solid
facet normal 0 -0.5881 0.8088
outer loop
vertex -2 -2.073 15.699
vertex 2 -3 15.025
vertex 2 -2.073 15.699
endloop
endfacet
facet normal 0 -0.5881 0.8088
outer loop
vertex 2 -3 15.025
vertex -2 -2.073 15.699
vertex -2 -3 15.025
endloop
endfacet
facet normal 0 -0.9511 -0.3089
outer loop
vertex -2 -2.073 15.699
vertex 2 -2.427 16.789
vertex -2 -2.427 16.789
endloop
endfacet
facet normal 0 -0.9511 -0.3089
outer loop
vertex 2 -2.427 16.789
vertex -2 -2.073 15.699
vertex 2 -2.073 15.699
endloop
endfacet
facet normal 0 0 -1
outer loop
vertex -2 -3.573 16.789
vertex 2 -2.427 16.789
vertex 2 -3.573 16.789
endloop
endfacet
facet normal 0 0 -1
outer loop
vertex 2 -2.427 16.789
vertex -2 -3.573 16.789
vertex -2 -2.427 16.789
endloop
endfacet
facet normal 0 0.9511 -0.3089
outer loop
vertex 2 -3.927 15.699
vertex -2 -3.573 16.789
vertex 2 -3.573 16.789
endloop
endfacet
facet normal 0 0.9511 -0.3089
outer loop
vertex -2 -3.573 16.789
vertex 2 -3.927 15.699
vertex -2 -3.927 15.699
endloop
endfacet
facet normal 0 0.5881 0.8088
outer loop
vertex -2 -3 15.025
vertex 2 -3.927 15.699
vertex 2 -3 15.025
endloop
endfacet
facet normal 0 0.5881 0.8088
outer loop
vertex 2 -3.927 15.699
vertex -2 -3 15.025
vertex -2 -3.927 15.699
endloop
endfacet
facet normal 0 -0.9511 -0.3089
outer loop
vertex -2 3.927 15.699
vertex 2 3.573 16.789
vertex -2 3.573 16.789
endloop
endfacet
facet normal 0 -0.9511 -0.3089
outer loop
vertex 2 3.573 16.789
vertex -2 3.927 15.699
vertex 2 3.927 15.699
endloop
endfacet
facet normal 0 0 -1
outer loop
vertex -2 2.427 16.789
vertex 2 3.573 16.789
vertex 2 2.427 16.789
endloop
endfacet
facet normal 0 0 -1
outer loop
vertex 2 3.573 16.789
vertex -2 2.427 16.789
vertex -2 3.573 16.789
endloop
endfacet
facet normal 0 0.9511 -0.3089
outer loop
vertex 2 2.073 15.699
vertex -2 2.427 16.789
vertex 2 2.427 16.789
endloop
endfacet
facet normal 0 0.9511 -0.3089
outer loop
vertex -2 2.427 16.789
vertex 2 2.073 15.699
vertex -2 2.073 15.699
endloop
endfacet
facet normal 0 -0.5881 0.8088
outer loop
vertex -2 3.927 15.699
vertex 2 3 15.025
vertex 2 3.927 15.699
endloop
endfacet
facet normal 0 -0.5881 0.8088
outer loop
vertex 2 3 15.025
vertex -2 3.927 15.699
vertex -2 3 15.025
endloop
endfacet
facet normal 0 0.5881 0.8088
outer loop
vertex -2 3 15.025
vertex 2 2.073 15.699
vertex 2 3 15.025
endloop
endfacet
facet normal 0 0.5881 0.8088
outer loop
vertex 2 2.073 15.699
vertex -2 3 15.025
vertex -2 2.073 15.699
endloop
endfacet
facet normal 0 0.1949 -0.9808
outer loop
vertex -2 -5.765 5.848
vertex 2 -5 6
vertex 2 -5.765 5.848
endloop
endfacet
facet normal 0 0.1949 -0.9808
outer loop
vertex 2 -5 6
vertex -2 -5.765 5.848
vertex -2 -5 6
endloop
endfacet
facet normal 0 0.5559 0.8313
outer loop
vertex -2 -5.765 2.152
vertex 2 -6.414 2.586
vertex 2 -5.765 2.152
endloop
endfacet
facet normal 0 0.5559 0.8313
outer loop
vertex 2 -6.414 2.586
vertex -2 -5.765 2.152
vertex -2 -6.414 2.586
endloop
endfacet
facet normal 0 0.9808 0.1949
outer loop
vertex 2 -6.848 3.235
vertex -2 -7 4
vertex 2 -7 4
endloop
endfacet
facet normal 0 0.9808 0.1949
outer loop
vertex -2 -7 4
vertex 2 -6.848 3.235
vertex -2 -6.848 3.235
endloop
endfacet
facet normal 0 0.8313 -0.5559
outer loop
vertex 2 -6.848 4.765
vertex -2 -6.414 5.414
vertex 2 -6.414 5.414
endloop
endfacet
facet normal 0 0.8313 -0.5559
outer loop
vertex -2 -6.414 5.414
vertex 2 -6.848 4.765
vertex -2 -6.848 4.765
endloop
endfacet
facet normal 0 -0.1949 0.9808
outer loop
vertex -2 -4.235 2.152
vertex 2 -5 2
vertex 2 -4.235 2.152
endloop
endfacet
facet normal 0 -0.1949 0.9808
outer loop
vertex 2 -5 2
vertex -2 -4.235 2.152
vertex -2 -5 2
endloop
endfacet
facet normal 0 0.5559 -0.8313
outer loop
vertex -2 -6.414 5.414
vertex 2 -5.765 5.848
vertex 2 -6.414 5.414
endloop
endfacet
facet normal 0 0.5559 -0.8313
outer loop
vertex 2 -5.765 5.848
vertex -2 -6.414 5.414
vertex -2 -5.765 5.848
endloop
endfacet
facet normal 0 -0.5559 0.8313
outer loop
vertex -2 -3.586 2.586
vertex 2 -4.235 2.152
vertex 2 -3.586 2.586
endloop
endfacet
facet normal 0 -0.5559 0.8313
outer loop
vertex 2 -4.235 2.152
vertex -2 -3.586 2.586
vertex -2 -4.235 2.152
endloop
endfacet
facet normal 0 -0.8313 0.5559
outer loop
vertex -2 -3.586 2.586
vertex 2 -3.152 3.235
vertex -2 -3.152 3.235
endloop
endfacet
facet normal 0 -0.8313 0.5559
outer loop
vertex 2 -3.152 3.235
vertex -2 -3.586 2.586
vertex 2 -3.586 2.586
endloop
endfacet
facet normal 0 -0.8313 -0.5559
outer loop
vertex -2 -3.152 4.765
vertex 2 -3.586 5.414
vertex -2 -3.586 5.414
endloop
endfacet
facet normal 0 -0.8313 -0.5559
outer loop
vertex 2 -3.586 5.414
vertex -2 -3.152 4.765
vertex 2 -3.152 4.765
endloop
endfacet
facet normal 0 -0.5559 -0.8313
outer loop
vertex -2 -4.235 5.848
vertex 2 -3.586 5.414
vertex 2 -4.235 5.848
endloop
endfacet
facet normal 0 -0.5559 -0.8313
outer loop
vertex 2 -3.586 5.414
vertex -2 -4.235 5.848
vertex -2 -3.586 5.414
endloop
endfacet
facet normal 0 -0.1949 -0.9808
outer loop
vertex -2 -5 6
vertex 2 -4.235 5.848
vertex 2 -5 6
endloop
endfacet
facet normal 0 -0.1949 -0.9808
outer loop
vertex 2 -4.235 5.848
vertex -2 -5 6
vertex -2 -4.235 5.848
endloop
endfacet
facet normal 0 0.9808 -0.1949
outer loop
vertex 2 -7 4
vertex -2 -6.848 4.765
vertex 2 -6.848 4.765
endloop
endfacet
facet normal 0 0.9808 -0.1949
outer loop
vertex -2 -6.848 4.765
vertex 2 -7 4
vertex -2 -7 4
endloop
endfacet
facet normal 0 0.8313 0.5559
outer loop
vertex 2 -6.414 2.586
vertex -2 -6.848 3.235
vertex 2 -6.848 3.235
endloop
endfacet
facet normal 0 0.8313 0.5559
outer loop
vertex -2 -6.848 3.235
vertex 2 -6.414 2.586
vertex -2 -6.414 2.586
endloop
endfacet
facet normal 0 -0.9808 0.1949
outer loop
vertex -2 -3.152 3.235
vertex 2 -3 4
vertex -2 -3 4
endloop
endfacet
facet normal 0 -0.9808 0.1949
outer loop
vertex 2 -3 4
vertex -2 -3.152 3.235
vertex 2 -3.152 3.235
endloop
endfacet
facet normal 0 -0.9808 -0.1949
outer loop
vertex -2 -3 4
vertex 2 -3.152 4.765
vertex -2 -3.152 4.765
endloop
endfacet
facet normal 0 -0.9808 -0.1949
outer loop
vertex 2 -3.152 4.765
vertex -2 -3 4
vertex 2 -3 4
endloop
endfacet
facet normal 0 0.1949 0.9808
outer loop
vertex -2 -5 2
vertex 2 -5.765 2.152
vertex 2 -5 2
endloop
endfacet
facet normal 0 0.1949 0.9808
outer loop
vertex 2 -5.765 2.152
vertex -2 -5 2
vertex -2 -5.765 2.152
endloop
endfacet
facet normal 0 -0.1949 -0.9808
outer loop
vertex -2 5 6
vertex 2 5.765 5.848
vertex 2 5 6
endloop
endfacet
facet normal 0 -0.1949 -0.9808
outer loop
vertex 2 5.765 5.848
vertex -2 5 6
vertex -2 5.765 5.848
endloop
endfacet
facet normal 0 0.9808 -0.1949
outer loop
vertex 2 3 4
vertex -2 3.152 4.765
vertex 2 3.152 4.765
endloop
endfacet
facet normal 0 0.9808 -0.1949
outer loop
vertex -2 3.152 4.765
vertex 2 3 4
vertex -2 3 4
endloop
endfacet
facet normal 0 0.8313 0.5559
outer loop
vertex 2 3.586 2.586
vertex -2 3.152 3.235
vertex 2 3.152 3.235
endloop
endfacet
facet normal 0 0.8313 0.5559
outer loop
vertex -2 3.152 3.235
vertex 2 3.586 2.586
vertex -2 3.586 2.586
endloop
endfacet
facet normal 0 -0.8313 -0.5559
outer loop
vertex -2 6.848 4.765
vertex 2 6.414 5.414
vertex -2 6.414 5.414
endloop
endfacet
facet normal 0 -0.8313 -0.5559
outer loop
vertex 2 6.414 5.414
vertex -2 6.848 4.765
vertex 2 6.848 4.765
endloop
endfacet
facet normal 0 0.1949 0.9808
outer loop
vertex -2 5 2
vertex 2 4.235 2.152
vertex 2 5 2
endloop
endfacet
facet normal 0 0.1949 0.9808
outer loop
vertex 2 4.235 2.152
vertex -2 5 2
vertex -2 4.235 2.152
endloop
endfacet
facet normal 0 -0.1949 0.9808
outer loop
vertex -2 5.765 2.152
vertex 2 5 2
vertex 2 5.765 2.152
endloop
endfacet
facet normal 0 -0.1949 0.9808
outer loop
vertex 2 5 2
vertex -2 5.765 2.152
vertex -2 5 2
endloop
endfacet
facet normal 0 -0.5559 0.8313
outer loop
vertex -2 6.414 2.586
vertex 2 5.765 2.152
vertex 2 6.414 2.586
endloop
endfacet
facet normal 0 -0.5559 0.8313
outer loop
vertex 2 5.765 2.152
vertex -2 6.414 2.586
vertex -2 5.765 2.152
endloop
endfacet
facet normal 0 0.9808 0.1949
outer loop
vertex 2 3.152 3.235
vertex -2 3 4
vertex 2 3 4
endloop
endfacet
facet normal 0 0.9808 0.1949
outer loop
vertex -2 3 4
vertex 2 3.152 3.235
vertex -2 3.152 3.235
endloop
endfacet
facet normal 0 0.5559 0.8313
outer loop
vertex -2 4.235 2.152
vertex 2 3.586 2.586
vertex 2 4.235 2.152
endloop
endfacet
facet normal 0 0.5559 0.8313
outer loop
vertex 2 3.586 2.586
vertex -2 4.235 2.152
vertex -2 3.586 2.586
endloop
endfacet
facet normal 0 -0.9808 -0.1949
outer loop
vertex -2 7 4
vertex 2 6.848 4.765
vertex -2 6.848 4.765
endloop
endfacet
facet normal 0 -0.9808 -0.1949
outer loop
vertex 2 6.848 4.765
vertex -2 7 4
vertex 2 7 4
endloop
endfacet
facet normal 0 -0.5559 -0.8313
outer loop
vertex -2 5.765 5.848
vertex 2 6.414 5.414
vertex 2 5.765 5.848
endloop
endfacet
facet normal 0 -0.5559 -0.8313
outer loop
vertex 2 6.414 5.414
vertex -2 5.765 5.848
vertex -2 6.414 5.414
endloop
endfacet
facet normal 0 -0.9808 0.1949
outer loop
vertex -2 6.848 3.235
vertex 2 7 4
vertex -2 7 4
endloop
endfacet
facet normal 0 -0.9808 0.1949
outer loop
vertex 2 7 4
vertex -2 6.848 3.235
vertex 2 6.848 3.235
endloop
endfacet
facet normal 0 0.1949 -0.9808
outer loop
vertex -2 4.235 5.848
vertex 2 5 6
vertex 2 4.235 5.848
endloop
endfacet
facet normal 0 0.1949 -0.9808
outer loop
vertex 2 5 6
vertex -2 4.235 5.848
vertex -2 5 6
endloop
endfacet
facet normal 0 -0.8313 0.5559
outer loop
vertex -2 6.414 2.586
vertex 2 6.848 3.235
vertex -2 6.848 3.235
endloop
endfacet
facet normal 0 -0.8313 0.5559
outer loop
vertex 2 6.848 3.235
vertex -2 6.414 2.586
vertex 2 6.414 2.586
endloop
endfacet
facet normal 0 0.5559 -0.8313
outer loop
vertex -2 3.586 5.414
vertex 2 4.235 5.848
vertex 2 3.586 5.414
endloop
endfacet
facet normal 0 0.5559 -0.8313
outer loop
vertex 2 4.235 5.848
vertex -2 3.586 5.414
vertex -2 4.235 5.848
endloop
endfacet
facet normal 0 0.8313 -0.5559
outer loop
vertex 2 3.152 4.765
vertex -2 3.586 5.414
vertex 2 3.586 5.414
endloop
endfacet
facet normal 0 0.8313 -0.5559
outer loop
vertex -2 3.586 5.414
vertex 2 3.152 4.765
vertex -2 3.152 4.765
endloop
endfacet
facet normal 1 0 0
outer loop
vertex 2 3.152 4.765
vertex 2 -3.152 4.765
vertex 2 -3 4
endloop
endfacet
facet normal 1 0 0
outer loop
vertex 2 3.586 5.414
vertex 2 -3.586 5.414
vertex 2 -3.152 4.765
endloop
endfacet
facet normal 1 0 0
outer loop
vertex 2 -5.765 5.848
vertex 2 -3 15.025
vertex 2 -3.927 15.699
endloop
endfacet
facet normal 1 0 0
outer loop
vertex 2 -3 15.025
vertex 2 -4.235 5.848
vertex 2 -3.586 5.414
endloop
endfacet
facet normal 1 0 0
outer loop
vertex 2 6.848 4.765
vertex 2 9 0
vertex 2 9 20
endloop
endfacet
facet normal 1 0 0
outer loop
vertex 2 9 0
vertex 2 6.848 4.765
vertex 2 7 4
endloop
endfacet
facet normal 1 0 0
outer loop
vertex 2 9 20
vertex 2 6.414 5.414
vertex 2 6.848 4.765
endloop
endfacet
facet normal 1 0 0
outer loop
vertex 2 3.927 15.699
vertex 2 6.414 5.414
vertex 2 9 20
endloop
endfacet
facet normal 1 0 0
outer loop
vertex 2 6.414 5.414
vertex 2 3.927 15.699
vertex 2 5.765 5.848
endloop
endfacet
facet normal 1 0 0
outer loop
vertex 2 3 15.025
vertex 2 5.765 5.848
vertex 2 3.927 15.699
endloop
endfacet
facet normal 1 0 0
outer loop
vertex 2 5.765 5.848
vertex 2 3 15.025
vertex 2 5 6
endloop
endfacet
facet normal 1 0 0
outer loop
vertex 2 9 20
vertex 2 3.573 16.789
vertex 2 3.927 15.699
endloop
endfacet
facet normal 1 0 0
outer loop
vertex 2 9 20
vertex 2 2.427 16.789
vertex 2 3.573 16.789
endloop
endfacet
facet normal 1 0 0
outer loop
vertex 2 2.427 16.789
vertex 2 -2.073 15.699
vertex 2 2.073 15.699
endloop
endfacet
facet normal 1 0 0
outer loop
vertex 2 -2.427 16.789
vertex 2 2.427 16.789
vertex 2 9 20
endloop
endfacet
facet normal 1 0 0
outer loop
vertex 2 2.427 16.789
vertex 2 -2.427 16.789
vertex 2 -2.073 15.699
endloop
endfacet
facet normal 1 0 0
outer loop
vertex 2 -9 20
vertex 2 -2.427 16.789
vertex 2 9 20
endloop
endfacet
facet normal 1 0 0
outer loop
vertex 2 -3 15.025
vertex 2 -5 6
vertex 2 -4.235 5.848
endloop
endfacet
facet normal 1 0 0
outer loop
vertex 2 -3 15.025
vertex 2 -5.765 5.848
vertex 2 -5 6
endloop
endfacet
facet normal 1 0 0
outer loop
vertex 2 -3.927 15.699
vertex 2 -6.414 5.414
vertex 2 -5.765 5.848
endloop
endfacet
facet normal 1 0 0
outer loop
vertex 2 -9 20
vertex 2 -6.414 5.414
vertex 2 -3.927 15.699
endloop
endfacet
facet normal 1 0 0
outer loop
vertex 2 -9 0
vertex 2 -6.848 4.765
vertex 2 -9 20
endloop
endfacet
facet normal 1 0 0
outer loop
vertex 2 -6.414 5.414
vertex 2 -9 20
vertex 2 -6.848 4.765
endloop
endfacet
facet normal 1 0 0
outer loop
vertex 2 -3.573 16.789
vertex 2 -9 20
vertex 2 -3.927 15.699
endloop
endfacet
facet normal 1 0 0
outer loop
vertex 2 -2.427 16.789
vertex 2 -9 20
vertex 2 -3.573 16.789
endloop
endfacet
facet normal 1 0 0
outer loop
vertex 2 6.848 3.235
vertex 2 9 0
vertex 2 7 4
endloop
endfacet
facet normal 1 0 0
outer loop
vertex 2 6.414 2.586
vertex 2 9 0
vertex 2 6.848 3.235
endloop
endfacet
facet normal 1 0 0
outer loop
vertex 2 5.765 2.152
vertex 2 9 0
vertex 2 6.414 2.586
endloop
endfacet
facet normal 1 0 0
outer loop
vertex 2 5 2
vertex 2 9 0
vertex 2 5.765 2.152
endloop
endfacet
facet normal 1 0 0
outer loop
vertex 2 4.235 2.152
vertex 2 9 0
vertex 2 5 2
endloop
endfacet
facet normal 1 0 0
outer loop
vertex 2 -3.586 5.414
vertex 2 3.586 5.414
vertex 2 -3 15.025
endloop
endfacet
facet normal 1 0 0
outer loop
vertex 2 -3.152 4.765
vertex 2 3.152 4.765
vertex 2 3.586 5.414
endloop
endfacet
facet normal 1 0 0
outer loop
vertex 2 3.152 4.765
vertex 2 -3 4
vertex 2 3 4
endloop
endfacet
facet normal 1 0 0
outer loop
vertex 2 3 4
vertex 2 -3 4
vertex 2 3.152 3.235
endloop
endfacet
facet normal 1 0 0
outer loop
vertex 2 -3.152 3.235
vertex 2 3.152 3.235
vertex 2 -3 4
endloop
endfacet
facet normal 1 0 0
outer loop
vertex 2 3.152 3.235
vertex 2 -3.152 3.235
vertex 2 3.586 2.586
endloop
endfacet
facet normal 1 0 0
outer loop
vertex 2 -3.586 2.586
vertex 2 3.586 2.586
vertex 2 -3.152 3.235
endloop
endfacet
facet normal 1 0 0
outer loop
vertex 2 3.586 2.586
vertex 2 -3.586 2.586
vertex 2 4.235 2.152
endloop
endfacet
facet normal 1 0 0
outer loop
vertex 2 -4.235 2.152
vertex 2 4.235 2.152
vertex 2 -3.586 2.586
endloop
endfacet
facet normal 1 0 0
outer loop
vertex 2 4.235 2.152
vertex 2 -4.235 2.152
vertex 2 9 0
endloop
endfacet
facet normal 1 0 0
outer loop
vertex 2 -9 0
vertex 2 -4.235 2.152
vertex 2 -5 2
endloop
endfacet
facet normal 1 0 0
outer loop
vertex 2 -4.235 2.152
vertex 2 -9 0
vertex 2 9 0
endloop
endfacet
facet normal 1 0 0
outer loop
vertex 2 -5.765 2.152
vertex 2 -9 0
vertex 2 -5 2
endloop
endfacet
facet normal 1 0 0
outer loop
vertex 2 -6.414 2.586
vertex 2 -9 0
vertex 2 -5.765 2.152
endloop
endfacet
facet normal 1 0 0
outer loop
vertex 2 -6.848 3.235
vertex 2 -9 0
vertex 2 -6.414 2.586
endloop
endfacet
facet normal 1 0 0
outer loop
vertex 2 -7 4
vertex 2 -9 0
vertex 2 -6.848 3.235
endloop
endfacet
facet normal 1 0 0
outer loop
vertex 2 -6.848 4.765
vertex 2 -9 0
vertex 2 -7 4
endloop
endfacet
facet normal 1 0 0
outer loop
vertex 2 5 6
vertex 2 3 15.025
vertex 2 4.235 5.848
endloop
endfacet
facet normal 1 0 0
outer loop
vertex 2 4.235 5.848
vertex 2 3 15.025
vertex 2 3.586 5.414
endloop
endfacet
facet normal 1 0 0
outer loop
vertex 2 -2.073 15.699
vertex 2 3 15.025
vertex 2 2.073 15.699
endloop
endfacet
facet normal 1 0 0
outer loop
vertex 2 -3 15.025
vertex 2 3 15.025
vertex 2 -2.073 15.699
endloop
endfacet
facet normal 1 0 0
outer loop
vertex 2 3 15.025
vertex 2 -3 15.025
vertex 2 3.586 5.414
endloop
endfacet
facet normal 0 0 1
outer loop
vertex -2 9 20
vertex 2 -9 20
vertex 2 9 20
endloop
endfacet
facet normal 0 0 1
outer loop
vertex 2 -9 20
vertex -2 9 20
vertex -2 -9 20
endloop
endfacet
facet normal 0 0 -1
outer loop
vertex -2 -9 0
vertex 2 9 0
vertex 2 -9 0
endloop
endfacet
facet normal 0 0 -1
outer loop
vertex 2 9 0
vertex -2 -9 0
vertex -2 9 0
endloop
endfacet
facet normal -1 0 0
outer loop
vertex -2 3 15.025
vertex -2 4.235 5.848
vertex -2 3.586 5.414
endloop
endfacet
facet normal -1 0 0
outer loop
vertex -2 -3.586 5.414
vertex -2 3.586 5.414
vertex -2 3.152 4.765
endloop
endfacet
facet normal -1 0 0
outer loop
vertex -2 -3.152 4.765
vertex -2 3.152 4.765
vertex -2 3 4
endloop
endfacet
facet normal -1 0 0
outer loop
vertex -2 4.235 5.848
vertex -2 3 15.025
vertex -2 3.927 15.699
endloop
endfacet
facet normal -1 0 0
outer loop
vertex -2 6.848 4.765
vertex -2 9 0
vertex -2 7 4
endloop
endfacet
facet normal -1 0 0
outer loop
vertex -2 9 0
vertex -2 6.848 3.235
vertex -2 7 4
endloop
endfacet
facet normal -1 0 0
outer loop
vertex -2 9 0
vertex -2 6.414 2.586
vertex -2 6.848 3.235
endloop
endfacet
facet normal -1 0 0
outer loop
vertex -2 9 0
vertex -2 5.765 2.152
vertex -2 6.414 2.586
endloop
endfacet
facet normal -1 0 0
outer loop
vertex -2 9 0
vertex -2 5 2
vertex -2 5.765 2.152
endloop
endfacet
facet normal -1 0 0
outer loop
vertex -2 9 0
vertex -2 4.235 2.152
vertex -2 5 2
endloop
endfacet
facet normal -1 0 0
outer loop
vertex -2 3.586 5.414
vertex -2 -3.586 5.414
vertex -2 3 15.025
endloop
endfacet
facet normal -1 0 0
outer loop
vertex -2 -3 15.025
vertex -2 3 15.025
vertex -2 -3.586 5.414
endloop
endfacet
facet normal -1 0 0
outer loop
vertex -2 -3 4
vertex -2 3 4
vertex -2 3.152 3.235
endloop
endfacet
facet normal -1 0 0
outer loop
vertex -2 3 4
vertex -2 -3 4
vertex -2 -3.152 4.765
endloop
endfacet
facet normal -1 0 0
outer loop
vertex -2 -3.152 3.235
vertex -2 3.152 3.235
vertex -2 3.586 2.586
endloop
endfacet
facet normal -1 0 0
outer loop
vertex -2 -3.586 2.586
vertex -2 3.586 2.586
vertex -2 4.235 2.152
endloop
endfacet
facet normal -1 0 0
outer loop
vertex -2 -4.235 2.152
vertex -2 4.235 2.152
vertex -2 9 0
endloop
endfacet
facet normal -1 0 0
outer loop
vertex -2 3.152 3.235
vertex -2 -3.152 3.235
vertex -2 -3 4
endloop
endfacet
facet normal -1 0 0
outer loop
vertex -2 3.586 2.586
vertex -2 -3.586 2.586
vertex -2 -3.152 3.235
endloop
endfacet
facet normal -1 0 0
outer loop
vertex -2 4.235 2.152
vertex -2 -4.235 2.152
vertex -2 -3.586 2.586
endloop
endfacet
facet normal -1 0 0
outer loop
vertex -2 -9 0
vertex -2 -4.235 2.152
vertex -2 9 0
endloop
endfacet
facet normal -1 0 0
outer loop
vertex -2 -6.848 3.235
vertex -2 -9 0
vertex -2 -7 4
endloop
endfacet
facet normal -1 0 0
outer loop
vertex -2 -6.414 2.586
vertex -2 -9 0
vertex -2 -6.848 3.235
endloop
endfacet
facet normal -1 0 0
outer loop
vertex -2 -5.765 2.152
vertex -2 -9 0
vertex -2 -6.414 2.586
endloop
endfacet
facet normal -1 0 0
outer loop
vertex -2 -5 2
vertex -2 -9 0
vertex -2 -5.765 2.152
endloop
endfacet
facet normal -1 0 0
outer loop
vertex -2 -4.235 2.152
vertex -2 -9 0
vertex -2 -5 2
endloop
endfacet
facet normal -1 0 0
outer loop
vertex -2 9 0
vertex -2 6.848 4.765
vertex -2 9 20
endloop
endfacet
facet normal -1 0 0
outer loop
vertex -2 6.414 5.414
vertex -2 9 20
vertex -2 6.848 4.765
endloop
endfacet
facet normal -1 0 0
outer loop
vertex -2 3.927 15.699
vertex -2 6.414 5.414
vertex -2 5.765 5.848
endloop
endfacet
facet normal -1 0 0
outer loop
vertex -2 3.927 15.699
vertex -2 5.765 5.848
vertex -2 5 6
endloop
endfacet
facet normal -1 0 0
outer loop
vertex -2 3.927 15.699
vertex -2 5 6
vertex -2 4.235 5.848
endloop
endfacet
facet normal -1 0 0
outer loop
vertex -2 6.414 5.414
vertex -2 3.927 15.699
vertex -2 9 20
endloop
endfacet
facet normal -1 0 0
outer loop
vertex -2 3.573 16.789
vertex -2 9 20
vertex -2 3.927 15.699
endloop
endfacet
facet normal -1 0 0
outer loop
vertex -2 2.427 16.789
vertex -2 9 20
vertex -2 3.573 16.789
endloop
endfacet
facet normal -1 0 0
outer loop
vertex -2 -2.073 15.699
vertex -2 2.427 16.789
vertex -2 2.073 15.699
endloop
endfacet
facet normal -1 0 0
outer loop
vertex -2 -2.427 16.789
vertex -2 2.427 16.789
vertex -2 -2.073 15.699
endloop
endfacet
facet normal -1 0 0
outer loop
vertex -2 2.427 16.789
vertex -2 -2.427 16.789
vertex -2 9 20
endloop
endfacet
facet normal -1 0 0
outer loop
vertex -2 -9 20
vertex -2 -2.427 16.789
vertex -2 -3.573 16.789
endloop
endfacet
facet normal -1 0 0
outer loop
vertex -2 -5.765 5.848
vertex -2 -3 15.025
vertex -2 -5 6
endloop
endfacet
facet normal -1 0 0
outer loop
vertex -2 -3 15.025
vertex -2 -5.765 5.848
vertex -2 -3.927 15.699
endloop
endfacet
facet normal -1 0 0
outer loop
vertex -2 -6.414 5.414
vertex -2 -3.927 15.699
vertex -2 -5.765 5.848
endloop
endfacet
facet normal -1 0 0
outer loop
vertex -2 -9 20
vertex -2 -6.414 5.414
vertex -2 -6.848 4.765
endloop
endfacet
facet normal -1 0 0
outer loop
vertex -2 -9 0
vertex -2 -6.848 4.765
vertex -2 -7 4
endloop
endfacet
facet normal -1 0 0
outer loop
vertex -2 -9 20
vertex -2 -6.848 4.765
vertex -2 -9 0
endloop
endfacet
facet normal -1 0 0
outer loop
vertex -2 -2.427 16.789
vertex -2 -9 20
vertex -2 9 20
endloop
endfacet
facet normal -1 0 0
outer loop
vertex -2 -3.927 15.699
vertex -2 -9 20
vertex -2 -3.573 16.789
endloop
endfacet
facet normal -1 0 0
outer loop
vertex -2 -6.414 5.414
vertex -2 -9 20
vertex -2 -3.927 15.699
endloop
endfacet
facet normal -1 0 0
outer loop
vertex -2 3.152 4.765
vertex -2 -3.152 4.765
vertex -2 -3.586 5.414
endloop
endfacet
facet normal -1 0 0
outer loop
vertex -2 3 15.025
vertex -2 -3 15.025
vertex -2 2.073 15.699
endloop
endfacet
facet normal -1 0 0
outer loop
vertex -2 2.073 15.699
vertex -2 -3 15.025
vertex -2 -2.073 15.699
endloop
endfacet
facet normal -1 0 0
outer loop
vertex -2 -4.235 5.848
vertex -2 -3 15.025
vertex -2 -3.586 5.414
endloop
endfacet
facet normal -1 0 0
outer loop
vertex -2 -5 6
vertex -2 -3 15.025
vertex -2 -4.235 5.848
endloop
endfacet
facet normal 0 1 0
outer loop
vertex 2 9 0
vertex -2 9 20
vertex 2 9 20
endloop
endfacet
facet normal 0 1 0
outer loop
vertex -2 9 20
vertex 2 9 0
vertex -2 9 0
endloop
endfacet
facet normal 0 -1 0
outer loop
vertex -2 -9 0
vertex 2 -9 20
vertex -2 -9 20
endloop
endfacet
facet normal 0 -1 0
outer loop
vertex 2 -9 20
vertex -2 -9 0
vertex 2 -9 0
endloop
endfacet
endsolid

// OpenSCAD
size = [4, 18, 20];
switch_mounting_screw_diameter = 1.95;

module DoorSwitchMount() {
  difference() {
    // Body
    translate([0, 0, size[2] / 2]) {
      cube(size, center=true);
    }

    // Side/switch mounting holes
    for(p = [[16, -3], [16, 3]]) {
      translate([0, p[1], p[0]]) {
        rotate([0, 90, 0]) {
          cylinder(h = size[0] + 0.1, d = switch_mounting_screw_diameter, center = true, $fn = 5);
        }
      }
    }

    // Side panel mounting holes
    for(p = [[4, -5], [4, 5]]) {
      translate([0, p[1], p[0]]) {
        rotate([0, 90, 0]) {
          cylinder(h = size[0] + 0.1, d = 4, center = true, $fn = 16);
        }
      }
    }
  }
}

DoorSwitchMount();
